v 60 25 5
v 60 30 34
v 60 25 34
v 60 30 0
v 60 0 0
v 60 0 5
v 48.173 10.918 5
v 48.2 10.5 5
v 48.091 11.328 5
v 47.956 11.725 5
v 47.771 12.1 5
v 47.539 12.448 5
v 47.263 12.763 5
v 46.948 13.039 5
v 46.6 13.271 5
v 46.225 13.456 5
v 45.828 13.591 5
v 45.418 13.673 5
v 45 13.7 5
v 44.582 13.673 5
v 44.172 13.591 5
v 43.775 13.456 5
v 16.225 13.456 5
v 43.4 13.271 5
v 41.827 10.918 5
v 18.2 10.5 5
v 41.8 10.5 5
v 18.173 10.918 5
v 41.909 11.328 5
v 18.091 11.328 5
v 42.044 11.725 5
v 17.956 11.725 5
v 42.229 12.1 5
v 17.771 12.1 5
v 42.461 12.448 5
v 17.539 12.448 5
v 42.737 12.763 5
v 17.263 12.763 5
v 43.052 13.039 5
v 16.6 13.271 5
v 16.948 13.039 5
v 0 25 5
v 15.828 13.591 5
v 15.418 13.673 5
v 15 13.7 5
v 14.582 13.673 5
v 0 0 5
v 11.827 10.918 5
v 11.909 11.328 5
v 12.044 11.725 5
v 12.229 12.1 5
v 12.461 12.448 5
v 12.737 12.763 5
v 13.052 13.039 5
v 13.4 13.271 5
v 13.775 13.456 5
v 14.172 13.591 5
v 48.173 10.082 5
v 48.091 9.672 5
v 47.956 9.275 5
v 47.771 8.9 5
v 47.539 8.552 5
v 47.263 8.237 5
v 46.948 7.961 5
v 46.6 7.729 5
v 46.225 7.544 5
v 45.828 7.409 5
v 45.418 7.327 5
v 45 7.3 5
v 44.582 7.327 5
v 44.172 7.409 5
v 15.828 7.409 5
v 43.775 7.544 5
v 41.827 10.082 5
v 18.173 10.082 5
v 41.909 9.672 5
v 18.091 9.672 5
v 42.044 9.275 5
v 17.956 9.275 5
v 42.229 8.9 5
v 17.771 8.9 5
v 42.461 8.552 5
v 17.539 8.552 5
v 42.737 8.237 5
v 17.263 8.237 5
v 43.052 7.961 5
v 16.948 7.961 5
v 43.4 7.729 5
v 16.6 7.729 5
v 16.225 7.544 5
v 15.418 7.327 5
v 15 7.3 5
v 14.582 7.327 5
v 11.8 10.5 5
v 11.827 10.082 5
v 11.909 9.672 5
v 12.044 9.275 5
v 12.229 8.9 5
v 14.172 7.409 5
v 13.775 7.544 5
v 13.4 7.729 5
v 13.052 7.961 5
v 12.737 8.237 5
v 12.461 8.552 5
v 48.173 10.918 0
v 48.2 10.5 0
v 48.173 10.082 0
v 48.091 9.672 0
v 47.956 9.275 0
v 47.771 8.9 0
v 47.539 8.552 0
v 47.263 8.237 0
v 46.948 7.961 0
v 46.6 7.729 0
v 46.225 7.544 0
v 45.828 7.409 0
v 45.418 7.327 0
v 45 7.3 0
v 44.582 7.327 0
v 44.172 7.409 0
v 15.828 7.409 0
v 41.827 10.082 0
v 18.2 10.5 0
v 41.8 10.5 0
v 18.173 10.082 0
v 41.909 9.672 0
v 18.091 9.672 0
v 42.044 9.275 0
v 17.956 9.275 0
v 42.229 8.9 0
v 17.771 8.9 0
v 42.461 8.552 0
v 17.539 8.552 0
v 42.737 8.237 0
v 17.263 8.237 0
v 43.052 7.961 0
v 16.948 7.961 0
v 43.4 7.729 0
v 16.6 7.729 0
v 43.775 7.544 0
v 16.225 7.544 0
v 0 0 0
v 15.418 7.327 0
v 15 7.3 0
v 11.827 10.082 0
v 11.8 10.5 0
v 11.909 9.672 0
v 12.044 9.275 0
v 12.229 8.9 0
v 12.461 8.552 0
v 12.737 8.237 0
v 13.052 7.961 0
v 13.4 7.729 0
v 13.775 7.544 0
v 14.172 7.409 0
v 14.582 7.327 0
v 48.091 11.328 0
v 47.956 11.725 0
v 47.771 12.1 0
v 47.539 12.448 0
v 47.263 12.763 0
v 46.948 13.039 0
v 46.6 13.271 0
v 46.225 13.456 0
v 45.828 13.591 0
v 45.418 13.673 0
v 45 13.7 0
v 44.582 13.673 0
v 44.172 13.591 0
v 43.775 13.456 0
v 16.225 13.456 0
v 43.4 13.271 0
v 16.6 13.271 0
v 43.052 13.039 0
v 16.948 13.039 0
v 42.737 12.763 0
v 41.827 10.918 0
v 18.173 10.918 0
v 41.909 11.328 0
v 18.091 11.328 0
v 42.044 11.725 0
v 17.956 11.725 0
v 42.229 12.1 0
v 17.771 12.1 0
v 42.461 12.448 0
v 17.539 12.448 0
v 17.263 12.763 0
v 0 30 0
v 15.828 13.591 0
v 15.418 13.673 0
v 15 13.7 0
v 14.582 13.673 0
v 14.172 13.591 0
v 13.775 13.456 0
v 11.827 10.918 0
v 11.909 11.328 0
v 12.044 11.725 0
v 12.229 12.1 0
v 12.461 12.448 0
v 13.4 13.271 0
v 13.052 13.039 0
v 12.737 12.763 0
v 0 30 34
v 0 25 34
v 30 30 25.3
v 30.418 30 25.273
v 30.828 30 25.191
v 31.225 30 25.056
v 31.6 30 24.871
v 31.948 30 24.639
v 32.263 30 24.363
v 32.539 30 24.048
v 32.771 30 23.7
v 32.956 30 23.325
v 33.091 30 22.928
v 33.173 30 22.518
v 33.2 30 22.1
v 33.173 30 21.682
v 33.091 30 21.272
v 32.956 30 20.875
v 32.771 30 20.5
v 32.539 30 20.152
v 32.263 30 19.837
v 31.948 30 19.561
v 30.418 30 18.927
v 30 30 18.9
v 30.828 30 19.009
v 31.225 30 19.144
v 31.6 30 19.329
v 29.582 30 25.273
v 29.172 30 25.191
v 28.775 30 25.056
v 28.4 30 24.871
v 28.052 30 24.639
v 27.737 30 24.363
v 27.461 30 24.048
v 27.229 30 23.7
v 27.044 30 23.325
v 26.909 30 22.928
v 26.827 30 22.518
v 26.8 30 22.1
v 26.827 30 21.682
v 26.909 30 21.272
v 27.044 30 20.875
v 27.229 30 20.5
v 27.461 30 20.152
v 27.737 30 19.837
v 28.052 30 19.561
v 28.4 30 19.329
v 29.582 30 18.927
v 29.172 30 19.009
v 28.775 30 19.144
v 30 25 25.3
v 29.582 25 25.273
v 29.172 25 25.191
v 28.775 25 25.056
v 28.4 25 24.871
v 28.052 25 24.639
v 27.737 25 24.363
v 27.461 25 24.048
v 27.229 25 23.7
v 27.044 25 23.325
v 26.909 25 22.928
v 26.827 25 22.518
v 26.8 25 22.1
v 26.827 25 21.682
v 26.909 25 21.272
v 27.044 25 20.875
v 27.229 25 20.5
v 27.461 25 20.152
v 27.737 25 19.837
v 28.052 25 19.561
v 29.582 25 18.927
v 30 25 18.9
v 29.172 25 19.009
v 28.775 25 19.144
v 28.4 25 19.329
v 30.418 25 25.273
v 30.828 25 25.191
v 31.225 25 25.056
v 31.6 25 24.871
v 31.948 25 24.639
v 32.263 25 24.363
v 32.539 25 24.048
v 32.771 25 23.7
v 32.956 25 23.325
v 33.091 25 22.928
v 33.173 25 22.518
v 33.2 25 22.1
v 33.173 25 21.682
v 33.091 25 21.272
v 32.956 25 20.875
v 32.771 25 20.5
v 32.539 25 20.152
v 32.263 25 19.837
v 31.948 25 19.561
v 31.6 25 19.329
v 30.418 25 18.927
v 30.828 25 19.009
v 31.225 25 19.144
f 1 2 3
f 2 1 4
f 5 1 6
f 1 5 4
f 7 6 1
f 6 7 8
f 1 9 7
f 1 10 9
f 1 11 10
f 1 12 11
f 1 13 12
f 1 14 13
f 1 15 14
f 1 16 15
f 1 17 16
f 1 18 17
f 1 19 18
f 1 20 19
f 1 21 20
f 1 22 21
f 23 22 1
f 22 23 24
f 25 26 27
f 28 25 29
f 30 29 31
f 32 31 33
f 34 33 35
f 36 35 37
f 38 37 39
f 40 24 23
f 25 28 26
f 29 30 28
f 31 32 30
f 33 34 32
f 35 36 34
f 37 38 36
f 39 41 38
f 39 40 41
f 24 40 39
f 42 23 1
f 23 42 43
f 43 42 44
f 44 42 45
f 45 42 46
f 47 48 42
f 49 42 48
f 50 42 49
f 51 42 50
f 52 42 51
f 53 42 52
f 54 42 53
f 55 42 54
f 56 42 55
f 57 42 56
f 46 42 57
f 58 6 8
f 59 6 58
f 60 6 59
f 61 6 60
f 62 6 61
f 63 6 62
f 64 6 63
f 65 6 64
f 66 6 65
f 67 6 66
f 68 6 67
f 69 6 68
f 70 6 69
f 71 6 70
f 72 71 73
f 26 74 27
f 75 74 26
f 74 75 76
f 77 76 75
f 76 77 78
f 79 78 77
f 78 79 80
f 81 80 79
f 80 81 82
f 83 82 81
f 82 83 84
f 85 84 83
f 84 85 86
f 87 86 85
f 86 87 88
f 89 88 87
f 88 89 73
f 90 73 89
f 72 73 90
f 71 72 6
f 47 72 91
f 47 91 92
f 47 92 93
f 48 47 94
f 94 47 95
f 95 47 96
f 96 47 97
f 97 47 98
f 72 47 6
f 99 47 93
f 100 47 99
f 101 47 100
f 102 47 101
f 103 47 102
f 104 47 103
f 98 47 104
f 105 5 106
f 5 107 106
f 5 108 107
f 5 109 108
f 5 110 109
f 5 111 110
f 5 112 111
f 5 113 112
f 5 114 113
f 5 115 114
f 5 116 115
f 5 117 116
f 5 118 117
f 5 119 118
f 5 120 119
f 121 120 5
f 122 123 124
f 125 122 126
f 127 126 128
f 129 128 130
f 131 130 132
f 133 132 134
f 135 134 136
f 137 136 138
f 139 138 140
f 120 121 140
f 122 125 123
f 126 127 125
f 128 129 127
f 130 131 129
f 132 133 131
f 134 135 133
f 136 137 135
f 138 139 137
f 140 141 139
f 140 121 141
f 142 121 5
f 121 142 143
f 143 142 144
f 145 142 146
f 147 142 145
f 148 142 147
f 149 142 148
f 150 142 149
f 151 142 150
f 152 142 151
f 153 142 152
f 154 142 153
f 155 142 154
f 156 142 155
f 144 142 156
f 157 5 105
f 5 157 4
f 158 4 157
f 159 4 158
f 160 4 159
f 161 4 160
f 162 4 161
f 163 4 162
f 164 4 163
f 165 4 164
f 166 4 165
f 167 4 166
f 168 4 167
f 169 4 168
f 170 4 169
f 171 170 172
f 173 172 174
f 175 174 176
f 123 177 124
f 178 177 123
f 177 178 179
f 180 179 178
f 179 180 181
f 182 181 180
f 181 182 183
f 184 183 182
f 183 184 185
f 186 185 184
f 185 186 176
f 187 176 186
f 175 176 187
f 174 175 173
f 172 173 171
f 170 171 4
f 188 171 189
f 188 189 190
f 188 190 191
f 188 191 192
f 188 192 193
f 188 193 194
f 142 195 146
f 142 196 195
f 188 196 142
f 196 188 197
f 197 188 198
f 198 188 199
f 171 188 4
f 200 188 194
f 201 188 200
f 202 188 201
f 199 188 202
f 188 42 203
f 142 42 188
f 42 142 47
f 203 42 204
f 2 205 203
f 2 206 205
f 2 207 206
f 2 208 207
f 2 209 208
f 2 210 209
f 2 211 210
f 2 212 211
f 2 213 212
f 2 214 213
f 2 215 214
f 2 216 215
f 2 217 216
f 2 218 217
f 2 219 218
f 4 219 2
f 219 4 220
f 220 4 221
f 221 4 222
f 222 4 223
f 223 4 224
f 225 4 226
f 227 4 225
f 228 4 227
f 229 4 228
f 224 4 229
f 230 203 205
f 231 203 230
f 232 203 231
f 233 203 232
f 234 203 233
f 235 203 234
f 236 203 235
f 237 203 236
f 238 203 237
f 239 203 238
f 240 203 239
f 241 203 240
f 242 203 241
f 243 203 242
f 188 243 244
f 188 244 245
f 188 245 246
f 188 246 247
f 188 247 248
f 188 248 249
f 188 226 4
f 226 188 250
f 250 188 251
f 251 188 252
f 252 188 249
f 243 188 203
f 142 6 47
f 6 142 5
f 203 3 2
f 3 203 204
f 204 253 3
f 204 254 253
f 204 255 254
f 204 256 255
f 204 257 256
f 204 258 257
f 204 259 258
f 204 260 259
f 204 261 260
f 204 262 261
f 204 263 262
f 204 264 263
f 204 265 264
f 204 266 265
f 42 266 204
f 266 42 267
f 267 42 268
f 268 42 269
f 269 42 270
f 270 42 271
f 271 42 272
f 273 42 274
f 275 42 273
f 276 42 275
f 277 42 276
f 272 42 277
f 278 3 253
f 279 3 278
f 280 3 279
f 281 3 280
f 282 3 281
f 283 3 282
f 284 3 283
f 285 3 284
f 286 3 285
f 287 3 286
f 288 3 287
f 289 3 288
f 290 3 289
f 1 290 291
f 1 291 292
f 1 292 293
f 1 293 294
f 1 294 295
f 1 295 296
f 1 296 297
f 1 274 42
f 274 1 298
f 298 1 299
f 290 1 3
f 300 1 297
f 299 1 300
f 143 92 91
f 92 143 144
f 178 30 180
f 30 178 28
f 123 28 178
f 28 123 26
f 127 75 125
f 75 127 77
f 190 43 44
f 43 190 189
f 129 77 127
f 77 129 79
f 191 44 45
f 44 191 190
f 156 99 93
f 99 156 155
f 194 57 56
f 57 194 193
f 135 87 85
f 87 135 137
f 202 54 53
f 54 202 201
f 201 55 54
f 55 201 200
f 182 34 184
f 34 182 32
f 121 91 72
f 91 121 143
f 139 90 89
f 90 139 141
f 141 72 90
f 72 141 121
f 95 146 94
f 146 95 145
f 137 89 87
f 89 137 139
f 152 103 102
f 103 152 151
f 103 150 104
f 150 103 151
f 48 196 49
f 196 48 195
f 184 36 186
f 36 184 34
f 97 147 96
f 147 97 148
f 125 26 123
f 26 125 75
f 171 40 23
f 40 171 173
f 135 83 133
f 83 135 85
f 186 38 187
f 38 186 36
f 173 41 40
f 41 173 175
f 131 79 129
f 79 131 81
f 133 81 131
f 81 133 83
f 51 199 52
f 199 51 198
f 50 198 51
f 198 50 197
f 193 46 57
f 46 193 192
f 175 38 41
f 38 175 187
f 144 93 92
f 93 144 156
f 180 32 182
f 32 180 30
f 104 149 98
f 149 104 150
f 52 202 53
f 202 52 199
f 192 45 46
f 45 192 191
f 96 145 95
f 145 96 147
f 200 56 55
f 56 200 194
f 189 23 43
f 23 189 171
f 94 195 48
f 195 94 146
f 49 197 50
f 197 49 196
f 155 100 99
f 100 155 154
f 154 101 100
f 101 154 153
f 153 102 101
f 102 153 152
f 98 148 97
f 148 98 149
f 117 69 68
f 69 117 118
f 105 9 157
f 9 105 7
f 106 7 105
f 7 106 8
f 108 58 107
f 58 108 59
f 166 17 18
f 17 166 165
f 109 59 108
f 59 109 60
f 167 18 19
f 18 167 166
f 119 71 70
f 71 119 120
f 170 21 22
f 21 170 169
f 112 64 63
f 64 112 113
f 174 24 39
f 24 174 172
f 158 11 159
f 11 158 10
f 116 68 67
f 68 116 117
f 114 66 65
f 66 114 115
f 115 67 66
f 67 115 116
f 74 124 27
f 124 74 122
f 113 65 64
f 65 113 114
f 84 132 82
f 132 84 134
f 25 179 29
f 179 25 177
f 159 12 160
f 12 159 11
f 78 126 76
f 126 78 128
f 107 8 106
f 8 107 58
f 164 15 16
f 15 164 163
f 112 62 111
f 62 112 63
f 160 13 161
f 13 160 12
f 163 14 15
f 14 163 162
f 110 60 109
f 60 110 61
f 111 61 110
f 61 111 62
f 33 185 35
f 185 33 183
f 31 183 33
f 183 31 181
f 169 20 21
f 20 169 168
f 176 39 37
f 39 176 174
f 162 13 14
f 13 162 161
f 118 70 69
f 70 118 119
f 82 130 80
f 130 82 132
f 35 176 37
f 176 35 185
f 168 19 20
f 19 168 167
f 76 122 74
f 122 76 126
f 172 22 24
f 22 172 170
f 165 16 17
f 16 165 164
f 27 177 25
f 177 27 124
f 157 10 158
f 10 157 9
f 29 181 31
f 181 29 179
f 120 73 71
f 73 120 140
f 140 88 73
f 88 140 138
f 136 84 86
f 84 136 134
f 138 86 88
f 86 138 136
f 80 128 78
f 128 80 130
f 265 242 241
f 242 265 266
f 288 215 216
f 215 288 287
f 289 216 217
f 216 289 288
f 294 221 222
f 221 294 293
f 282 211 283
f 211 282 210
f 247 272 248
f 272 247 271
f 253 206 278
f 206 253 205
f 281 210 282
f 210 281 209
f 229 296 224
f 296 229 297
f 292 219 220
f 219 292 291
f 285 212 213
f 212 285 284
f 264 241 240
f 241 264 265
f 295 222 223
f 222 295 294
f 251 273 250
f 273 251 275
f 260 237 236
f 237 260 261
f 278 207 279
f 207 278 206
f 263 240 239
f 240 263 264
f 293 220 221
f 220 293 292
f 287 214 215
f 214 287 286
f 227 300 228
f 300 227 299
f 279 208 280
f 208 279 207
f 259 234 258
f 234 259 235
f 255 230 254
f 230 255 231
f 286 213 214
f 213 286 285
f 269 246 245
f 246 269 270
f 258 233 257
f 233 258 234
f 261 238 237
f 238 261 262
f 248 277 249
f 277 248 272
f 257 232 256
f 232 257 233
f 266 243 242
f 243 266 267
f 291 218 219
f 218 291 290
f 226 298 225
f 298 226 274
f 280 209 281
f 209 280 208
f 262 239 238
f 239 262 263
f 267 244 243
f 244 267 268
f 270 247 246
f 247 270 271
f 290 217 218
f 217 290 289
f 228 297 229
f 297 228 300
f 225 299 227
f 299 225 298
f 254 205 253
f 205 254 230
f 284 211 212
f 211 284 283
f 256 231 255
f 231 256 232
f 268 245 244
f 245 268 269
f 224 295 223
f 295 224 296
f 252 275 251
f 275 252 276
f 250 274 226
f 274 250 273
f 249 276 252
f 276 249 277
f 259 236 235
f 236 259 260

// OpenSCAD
// L-shaped mounting bracket, the model drawn in the user guide by the Pandoc filter.
// Original to this repository (MIT). The variables can be overridden with define-NAME attributes.
$fn = 48;

base_length = 60;   // length of the bracket along X
base_width = 30;    // width of the bracket along Y
thickness = 5;      // thickness of both legs
wall_height = 34;   // height of the upright leg, from the floor
hole_radius = 3.2;  // radius of the mounting holes

module bracket() {
    difference() {
        union() {
            // The foot lies on the floor, the upright leg rises from its back edge.
            cube([base_length, base_width, thickness]);
            translate([0, base_width - thickness, 0]) cube([base_length, thickness, wall_height]);
        }
        // Two mounting holes through the foot.
        for (x = [base_length * 0.25, base_length * 0.75])
            translate([x, base_width * 0.35, -1]) cylinder(r = hole_radius, h = thickness + 2);
        // One hole through the upright leg.
        translate([base_length / 2, base_width + 1, wall_height * 0.65])
            rotate([90, 0, 0]) cylinder(r = hole_radius, h = thickness + 2);
    }
}

bracket();
